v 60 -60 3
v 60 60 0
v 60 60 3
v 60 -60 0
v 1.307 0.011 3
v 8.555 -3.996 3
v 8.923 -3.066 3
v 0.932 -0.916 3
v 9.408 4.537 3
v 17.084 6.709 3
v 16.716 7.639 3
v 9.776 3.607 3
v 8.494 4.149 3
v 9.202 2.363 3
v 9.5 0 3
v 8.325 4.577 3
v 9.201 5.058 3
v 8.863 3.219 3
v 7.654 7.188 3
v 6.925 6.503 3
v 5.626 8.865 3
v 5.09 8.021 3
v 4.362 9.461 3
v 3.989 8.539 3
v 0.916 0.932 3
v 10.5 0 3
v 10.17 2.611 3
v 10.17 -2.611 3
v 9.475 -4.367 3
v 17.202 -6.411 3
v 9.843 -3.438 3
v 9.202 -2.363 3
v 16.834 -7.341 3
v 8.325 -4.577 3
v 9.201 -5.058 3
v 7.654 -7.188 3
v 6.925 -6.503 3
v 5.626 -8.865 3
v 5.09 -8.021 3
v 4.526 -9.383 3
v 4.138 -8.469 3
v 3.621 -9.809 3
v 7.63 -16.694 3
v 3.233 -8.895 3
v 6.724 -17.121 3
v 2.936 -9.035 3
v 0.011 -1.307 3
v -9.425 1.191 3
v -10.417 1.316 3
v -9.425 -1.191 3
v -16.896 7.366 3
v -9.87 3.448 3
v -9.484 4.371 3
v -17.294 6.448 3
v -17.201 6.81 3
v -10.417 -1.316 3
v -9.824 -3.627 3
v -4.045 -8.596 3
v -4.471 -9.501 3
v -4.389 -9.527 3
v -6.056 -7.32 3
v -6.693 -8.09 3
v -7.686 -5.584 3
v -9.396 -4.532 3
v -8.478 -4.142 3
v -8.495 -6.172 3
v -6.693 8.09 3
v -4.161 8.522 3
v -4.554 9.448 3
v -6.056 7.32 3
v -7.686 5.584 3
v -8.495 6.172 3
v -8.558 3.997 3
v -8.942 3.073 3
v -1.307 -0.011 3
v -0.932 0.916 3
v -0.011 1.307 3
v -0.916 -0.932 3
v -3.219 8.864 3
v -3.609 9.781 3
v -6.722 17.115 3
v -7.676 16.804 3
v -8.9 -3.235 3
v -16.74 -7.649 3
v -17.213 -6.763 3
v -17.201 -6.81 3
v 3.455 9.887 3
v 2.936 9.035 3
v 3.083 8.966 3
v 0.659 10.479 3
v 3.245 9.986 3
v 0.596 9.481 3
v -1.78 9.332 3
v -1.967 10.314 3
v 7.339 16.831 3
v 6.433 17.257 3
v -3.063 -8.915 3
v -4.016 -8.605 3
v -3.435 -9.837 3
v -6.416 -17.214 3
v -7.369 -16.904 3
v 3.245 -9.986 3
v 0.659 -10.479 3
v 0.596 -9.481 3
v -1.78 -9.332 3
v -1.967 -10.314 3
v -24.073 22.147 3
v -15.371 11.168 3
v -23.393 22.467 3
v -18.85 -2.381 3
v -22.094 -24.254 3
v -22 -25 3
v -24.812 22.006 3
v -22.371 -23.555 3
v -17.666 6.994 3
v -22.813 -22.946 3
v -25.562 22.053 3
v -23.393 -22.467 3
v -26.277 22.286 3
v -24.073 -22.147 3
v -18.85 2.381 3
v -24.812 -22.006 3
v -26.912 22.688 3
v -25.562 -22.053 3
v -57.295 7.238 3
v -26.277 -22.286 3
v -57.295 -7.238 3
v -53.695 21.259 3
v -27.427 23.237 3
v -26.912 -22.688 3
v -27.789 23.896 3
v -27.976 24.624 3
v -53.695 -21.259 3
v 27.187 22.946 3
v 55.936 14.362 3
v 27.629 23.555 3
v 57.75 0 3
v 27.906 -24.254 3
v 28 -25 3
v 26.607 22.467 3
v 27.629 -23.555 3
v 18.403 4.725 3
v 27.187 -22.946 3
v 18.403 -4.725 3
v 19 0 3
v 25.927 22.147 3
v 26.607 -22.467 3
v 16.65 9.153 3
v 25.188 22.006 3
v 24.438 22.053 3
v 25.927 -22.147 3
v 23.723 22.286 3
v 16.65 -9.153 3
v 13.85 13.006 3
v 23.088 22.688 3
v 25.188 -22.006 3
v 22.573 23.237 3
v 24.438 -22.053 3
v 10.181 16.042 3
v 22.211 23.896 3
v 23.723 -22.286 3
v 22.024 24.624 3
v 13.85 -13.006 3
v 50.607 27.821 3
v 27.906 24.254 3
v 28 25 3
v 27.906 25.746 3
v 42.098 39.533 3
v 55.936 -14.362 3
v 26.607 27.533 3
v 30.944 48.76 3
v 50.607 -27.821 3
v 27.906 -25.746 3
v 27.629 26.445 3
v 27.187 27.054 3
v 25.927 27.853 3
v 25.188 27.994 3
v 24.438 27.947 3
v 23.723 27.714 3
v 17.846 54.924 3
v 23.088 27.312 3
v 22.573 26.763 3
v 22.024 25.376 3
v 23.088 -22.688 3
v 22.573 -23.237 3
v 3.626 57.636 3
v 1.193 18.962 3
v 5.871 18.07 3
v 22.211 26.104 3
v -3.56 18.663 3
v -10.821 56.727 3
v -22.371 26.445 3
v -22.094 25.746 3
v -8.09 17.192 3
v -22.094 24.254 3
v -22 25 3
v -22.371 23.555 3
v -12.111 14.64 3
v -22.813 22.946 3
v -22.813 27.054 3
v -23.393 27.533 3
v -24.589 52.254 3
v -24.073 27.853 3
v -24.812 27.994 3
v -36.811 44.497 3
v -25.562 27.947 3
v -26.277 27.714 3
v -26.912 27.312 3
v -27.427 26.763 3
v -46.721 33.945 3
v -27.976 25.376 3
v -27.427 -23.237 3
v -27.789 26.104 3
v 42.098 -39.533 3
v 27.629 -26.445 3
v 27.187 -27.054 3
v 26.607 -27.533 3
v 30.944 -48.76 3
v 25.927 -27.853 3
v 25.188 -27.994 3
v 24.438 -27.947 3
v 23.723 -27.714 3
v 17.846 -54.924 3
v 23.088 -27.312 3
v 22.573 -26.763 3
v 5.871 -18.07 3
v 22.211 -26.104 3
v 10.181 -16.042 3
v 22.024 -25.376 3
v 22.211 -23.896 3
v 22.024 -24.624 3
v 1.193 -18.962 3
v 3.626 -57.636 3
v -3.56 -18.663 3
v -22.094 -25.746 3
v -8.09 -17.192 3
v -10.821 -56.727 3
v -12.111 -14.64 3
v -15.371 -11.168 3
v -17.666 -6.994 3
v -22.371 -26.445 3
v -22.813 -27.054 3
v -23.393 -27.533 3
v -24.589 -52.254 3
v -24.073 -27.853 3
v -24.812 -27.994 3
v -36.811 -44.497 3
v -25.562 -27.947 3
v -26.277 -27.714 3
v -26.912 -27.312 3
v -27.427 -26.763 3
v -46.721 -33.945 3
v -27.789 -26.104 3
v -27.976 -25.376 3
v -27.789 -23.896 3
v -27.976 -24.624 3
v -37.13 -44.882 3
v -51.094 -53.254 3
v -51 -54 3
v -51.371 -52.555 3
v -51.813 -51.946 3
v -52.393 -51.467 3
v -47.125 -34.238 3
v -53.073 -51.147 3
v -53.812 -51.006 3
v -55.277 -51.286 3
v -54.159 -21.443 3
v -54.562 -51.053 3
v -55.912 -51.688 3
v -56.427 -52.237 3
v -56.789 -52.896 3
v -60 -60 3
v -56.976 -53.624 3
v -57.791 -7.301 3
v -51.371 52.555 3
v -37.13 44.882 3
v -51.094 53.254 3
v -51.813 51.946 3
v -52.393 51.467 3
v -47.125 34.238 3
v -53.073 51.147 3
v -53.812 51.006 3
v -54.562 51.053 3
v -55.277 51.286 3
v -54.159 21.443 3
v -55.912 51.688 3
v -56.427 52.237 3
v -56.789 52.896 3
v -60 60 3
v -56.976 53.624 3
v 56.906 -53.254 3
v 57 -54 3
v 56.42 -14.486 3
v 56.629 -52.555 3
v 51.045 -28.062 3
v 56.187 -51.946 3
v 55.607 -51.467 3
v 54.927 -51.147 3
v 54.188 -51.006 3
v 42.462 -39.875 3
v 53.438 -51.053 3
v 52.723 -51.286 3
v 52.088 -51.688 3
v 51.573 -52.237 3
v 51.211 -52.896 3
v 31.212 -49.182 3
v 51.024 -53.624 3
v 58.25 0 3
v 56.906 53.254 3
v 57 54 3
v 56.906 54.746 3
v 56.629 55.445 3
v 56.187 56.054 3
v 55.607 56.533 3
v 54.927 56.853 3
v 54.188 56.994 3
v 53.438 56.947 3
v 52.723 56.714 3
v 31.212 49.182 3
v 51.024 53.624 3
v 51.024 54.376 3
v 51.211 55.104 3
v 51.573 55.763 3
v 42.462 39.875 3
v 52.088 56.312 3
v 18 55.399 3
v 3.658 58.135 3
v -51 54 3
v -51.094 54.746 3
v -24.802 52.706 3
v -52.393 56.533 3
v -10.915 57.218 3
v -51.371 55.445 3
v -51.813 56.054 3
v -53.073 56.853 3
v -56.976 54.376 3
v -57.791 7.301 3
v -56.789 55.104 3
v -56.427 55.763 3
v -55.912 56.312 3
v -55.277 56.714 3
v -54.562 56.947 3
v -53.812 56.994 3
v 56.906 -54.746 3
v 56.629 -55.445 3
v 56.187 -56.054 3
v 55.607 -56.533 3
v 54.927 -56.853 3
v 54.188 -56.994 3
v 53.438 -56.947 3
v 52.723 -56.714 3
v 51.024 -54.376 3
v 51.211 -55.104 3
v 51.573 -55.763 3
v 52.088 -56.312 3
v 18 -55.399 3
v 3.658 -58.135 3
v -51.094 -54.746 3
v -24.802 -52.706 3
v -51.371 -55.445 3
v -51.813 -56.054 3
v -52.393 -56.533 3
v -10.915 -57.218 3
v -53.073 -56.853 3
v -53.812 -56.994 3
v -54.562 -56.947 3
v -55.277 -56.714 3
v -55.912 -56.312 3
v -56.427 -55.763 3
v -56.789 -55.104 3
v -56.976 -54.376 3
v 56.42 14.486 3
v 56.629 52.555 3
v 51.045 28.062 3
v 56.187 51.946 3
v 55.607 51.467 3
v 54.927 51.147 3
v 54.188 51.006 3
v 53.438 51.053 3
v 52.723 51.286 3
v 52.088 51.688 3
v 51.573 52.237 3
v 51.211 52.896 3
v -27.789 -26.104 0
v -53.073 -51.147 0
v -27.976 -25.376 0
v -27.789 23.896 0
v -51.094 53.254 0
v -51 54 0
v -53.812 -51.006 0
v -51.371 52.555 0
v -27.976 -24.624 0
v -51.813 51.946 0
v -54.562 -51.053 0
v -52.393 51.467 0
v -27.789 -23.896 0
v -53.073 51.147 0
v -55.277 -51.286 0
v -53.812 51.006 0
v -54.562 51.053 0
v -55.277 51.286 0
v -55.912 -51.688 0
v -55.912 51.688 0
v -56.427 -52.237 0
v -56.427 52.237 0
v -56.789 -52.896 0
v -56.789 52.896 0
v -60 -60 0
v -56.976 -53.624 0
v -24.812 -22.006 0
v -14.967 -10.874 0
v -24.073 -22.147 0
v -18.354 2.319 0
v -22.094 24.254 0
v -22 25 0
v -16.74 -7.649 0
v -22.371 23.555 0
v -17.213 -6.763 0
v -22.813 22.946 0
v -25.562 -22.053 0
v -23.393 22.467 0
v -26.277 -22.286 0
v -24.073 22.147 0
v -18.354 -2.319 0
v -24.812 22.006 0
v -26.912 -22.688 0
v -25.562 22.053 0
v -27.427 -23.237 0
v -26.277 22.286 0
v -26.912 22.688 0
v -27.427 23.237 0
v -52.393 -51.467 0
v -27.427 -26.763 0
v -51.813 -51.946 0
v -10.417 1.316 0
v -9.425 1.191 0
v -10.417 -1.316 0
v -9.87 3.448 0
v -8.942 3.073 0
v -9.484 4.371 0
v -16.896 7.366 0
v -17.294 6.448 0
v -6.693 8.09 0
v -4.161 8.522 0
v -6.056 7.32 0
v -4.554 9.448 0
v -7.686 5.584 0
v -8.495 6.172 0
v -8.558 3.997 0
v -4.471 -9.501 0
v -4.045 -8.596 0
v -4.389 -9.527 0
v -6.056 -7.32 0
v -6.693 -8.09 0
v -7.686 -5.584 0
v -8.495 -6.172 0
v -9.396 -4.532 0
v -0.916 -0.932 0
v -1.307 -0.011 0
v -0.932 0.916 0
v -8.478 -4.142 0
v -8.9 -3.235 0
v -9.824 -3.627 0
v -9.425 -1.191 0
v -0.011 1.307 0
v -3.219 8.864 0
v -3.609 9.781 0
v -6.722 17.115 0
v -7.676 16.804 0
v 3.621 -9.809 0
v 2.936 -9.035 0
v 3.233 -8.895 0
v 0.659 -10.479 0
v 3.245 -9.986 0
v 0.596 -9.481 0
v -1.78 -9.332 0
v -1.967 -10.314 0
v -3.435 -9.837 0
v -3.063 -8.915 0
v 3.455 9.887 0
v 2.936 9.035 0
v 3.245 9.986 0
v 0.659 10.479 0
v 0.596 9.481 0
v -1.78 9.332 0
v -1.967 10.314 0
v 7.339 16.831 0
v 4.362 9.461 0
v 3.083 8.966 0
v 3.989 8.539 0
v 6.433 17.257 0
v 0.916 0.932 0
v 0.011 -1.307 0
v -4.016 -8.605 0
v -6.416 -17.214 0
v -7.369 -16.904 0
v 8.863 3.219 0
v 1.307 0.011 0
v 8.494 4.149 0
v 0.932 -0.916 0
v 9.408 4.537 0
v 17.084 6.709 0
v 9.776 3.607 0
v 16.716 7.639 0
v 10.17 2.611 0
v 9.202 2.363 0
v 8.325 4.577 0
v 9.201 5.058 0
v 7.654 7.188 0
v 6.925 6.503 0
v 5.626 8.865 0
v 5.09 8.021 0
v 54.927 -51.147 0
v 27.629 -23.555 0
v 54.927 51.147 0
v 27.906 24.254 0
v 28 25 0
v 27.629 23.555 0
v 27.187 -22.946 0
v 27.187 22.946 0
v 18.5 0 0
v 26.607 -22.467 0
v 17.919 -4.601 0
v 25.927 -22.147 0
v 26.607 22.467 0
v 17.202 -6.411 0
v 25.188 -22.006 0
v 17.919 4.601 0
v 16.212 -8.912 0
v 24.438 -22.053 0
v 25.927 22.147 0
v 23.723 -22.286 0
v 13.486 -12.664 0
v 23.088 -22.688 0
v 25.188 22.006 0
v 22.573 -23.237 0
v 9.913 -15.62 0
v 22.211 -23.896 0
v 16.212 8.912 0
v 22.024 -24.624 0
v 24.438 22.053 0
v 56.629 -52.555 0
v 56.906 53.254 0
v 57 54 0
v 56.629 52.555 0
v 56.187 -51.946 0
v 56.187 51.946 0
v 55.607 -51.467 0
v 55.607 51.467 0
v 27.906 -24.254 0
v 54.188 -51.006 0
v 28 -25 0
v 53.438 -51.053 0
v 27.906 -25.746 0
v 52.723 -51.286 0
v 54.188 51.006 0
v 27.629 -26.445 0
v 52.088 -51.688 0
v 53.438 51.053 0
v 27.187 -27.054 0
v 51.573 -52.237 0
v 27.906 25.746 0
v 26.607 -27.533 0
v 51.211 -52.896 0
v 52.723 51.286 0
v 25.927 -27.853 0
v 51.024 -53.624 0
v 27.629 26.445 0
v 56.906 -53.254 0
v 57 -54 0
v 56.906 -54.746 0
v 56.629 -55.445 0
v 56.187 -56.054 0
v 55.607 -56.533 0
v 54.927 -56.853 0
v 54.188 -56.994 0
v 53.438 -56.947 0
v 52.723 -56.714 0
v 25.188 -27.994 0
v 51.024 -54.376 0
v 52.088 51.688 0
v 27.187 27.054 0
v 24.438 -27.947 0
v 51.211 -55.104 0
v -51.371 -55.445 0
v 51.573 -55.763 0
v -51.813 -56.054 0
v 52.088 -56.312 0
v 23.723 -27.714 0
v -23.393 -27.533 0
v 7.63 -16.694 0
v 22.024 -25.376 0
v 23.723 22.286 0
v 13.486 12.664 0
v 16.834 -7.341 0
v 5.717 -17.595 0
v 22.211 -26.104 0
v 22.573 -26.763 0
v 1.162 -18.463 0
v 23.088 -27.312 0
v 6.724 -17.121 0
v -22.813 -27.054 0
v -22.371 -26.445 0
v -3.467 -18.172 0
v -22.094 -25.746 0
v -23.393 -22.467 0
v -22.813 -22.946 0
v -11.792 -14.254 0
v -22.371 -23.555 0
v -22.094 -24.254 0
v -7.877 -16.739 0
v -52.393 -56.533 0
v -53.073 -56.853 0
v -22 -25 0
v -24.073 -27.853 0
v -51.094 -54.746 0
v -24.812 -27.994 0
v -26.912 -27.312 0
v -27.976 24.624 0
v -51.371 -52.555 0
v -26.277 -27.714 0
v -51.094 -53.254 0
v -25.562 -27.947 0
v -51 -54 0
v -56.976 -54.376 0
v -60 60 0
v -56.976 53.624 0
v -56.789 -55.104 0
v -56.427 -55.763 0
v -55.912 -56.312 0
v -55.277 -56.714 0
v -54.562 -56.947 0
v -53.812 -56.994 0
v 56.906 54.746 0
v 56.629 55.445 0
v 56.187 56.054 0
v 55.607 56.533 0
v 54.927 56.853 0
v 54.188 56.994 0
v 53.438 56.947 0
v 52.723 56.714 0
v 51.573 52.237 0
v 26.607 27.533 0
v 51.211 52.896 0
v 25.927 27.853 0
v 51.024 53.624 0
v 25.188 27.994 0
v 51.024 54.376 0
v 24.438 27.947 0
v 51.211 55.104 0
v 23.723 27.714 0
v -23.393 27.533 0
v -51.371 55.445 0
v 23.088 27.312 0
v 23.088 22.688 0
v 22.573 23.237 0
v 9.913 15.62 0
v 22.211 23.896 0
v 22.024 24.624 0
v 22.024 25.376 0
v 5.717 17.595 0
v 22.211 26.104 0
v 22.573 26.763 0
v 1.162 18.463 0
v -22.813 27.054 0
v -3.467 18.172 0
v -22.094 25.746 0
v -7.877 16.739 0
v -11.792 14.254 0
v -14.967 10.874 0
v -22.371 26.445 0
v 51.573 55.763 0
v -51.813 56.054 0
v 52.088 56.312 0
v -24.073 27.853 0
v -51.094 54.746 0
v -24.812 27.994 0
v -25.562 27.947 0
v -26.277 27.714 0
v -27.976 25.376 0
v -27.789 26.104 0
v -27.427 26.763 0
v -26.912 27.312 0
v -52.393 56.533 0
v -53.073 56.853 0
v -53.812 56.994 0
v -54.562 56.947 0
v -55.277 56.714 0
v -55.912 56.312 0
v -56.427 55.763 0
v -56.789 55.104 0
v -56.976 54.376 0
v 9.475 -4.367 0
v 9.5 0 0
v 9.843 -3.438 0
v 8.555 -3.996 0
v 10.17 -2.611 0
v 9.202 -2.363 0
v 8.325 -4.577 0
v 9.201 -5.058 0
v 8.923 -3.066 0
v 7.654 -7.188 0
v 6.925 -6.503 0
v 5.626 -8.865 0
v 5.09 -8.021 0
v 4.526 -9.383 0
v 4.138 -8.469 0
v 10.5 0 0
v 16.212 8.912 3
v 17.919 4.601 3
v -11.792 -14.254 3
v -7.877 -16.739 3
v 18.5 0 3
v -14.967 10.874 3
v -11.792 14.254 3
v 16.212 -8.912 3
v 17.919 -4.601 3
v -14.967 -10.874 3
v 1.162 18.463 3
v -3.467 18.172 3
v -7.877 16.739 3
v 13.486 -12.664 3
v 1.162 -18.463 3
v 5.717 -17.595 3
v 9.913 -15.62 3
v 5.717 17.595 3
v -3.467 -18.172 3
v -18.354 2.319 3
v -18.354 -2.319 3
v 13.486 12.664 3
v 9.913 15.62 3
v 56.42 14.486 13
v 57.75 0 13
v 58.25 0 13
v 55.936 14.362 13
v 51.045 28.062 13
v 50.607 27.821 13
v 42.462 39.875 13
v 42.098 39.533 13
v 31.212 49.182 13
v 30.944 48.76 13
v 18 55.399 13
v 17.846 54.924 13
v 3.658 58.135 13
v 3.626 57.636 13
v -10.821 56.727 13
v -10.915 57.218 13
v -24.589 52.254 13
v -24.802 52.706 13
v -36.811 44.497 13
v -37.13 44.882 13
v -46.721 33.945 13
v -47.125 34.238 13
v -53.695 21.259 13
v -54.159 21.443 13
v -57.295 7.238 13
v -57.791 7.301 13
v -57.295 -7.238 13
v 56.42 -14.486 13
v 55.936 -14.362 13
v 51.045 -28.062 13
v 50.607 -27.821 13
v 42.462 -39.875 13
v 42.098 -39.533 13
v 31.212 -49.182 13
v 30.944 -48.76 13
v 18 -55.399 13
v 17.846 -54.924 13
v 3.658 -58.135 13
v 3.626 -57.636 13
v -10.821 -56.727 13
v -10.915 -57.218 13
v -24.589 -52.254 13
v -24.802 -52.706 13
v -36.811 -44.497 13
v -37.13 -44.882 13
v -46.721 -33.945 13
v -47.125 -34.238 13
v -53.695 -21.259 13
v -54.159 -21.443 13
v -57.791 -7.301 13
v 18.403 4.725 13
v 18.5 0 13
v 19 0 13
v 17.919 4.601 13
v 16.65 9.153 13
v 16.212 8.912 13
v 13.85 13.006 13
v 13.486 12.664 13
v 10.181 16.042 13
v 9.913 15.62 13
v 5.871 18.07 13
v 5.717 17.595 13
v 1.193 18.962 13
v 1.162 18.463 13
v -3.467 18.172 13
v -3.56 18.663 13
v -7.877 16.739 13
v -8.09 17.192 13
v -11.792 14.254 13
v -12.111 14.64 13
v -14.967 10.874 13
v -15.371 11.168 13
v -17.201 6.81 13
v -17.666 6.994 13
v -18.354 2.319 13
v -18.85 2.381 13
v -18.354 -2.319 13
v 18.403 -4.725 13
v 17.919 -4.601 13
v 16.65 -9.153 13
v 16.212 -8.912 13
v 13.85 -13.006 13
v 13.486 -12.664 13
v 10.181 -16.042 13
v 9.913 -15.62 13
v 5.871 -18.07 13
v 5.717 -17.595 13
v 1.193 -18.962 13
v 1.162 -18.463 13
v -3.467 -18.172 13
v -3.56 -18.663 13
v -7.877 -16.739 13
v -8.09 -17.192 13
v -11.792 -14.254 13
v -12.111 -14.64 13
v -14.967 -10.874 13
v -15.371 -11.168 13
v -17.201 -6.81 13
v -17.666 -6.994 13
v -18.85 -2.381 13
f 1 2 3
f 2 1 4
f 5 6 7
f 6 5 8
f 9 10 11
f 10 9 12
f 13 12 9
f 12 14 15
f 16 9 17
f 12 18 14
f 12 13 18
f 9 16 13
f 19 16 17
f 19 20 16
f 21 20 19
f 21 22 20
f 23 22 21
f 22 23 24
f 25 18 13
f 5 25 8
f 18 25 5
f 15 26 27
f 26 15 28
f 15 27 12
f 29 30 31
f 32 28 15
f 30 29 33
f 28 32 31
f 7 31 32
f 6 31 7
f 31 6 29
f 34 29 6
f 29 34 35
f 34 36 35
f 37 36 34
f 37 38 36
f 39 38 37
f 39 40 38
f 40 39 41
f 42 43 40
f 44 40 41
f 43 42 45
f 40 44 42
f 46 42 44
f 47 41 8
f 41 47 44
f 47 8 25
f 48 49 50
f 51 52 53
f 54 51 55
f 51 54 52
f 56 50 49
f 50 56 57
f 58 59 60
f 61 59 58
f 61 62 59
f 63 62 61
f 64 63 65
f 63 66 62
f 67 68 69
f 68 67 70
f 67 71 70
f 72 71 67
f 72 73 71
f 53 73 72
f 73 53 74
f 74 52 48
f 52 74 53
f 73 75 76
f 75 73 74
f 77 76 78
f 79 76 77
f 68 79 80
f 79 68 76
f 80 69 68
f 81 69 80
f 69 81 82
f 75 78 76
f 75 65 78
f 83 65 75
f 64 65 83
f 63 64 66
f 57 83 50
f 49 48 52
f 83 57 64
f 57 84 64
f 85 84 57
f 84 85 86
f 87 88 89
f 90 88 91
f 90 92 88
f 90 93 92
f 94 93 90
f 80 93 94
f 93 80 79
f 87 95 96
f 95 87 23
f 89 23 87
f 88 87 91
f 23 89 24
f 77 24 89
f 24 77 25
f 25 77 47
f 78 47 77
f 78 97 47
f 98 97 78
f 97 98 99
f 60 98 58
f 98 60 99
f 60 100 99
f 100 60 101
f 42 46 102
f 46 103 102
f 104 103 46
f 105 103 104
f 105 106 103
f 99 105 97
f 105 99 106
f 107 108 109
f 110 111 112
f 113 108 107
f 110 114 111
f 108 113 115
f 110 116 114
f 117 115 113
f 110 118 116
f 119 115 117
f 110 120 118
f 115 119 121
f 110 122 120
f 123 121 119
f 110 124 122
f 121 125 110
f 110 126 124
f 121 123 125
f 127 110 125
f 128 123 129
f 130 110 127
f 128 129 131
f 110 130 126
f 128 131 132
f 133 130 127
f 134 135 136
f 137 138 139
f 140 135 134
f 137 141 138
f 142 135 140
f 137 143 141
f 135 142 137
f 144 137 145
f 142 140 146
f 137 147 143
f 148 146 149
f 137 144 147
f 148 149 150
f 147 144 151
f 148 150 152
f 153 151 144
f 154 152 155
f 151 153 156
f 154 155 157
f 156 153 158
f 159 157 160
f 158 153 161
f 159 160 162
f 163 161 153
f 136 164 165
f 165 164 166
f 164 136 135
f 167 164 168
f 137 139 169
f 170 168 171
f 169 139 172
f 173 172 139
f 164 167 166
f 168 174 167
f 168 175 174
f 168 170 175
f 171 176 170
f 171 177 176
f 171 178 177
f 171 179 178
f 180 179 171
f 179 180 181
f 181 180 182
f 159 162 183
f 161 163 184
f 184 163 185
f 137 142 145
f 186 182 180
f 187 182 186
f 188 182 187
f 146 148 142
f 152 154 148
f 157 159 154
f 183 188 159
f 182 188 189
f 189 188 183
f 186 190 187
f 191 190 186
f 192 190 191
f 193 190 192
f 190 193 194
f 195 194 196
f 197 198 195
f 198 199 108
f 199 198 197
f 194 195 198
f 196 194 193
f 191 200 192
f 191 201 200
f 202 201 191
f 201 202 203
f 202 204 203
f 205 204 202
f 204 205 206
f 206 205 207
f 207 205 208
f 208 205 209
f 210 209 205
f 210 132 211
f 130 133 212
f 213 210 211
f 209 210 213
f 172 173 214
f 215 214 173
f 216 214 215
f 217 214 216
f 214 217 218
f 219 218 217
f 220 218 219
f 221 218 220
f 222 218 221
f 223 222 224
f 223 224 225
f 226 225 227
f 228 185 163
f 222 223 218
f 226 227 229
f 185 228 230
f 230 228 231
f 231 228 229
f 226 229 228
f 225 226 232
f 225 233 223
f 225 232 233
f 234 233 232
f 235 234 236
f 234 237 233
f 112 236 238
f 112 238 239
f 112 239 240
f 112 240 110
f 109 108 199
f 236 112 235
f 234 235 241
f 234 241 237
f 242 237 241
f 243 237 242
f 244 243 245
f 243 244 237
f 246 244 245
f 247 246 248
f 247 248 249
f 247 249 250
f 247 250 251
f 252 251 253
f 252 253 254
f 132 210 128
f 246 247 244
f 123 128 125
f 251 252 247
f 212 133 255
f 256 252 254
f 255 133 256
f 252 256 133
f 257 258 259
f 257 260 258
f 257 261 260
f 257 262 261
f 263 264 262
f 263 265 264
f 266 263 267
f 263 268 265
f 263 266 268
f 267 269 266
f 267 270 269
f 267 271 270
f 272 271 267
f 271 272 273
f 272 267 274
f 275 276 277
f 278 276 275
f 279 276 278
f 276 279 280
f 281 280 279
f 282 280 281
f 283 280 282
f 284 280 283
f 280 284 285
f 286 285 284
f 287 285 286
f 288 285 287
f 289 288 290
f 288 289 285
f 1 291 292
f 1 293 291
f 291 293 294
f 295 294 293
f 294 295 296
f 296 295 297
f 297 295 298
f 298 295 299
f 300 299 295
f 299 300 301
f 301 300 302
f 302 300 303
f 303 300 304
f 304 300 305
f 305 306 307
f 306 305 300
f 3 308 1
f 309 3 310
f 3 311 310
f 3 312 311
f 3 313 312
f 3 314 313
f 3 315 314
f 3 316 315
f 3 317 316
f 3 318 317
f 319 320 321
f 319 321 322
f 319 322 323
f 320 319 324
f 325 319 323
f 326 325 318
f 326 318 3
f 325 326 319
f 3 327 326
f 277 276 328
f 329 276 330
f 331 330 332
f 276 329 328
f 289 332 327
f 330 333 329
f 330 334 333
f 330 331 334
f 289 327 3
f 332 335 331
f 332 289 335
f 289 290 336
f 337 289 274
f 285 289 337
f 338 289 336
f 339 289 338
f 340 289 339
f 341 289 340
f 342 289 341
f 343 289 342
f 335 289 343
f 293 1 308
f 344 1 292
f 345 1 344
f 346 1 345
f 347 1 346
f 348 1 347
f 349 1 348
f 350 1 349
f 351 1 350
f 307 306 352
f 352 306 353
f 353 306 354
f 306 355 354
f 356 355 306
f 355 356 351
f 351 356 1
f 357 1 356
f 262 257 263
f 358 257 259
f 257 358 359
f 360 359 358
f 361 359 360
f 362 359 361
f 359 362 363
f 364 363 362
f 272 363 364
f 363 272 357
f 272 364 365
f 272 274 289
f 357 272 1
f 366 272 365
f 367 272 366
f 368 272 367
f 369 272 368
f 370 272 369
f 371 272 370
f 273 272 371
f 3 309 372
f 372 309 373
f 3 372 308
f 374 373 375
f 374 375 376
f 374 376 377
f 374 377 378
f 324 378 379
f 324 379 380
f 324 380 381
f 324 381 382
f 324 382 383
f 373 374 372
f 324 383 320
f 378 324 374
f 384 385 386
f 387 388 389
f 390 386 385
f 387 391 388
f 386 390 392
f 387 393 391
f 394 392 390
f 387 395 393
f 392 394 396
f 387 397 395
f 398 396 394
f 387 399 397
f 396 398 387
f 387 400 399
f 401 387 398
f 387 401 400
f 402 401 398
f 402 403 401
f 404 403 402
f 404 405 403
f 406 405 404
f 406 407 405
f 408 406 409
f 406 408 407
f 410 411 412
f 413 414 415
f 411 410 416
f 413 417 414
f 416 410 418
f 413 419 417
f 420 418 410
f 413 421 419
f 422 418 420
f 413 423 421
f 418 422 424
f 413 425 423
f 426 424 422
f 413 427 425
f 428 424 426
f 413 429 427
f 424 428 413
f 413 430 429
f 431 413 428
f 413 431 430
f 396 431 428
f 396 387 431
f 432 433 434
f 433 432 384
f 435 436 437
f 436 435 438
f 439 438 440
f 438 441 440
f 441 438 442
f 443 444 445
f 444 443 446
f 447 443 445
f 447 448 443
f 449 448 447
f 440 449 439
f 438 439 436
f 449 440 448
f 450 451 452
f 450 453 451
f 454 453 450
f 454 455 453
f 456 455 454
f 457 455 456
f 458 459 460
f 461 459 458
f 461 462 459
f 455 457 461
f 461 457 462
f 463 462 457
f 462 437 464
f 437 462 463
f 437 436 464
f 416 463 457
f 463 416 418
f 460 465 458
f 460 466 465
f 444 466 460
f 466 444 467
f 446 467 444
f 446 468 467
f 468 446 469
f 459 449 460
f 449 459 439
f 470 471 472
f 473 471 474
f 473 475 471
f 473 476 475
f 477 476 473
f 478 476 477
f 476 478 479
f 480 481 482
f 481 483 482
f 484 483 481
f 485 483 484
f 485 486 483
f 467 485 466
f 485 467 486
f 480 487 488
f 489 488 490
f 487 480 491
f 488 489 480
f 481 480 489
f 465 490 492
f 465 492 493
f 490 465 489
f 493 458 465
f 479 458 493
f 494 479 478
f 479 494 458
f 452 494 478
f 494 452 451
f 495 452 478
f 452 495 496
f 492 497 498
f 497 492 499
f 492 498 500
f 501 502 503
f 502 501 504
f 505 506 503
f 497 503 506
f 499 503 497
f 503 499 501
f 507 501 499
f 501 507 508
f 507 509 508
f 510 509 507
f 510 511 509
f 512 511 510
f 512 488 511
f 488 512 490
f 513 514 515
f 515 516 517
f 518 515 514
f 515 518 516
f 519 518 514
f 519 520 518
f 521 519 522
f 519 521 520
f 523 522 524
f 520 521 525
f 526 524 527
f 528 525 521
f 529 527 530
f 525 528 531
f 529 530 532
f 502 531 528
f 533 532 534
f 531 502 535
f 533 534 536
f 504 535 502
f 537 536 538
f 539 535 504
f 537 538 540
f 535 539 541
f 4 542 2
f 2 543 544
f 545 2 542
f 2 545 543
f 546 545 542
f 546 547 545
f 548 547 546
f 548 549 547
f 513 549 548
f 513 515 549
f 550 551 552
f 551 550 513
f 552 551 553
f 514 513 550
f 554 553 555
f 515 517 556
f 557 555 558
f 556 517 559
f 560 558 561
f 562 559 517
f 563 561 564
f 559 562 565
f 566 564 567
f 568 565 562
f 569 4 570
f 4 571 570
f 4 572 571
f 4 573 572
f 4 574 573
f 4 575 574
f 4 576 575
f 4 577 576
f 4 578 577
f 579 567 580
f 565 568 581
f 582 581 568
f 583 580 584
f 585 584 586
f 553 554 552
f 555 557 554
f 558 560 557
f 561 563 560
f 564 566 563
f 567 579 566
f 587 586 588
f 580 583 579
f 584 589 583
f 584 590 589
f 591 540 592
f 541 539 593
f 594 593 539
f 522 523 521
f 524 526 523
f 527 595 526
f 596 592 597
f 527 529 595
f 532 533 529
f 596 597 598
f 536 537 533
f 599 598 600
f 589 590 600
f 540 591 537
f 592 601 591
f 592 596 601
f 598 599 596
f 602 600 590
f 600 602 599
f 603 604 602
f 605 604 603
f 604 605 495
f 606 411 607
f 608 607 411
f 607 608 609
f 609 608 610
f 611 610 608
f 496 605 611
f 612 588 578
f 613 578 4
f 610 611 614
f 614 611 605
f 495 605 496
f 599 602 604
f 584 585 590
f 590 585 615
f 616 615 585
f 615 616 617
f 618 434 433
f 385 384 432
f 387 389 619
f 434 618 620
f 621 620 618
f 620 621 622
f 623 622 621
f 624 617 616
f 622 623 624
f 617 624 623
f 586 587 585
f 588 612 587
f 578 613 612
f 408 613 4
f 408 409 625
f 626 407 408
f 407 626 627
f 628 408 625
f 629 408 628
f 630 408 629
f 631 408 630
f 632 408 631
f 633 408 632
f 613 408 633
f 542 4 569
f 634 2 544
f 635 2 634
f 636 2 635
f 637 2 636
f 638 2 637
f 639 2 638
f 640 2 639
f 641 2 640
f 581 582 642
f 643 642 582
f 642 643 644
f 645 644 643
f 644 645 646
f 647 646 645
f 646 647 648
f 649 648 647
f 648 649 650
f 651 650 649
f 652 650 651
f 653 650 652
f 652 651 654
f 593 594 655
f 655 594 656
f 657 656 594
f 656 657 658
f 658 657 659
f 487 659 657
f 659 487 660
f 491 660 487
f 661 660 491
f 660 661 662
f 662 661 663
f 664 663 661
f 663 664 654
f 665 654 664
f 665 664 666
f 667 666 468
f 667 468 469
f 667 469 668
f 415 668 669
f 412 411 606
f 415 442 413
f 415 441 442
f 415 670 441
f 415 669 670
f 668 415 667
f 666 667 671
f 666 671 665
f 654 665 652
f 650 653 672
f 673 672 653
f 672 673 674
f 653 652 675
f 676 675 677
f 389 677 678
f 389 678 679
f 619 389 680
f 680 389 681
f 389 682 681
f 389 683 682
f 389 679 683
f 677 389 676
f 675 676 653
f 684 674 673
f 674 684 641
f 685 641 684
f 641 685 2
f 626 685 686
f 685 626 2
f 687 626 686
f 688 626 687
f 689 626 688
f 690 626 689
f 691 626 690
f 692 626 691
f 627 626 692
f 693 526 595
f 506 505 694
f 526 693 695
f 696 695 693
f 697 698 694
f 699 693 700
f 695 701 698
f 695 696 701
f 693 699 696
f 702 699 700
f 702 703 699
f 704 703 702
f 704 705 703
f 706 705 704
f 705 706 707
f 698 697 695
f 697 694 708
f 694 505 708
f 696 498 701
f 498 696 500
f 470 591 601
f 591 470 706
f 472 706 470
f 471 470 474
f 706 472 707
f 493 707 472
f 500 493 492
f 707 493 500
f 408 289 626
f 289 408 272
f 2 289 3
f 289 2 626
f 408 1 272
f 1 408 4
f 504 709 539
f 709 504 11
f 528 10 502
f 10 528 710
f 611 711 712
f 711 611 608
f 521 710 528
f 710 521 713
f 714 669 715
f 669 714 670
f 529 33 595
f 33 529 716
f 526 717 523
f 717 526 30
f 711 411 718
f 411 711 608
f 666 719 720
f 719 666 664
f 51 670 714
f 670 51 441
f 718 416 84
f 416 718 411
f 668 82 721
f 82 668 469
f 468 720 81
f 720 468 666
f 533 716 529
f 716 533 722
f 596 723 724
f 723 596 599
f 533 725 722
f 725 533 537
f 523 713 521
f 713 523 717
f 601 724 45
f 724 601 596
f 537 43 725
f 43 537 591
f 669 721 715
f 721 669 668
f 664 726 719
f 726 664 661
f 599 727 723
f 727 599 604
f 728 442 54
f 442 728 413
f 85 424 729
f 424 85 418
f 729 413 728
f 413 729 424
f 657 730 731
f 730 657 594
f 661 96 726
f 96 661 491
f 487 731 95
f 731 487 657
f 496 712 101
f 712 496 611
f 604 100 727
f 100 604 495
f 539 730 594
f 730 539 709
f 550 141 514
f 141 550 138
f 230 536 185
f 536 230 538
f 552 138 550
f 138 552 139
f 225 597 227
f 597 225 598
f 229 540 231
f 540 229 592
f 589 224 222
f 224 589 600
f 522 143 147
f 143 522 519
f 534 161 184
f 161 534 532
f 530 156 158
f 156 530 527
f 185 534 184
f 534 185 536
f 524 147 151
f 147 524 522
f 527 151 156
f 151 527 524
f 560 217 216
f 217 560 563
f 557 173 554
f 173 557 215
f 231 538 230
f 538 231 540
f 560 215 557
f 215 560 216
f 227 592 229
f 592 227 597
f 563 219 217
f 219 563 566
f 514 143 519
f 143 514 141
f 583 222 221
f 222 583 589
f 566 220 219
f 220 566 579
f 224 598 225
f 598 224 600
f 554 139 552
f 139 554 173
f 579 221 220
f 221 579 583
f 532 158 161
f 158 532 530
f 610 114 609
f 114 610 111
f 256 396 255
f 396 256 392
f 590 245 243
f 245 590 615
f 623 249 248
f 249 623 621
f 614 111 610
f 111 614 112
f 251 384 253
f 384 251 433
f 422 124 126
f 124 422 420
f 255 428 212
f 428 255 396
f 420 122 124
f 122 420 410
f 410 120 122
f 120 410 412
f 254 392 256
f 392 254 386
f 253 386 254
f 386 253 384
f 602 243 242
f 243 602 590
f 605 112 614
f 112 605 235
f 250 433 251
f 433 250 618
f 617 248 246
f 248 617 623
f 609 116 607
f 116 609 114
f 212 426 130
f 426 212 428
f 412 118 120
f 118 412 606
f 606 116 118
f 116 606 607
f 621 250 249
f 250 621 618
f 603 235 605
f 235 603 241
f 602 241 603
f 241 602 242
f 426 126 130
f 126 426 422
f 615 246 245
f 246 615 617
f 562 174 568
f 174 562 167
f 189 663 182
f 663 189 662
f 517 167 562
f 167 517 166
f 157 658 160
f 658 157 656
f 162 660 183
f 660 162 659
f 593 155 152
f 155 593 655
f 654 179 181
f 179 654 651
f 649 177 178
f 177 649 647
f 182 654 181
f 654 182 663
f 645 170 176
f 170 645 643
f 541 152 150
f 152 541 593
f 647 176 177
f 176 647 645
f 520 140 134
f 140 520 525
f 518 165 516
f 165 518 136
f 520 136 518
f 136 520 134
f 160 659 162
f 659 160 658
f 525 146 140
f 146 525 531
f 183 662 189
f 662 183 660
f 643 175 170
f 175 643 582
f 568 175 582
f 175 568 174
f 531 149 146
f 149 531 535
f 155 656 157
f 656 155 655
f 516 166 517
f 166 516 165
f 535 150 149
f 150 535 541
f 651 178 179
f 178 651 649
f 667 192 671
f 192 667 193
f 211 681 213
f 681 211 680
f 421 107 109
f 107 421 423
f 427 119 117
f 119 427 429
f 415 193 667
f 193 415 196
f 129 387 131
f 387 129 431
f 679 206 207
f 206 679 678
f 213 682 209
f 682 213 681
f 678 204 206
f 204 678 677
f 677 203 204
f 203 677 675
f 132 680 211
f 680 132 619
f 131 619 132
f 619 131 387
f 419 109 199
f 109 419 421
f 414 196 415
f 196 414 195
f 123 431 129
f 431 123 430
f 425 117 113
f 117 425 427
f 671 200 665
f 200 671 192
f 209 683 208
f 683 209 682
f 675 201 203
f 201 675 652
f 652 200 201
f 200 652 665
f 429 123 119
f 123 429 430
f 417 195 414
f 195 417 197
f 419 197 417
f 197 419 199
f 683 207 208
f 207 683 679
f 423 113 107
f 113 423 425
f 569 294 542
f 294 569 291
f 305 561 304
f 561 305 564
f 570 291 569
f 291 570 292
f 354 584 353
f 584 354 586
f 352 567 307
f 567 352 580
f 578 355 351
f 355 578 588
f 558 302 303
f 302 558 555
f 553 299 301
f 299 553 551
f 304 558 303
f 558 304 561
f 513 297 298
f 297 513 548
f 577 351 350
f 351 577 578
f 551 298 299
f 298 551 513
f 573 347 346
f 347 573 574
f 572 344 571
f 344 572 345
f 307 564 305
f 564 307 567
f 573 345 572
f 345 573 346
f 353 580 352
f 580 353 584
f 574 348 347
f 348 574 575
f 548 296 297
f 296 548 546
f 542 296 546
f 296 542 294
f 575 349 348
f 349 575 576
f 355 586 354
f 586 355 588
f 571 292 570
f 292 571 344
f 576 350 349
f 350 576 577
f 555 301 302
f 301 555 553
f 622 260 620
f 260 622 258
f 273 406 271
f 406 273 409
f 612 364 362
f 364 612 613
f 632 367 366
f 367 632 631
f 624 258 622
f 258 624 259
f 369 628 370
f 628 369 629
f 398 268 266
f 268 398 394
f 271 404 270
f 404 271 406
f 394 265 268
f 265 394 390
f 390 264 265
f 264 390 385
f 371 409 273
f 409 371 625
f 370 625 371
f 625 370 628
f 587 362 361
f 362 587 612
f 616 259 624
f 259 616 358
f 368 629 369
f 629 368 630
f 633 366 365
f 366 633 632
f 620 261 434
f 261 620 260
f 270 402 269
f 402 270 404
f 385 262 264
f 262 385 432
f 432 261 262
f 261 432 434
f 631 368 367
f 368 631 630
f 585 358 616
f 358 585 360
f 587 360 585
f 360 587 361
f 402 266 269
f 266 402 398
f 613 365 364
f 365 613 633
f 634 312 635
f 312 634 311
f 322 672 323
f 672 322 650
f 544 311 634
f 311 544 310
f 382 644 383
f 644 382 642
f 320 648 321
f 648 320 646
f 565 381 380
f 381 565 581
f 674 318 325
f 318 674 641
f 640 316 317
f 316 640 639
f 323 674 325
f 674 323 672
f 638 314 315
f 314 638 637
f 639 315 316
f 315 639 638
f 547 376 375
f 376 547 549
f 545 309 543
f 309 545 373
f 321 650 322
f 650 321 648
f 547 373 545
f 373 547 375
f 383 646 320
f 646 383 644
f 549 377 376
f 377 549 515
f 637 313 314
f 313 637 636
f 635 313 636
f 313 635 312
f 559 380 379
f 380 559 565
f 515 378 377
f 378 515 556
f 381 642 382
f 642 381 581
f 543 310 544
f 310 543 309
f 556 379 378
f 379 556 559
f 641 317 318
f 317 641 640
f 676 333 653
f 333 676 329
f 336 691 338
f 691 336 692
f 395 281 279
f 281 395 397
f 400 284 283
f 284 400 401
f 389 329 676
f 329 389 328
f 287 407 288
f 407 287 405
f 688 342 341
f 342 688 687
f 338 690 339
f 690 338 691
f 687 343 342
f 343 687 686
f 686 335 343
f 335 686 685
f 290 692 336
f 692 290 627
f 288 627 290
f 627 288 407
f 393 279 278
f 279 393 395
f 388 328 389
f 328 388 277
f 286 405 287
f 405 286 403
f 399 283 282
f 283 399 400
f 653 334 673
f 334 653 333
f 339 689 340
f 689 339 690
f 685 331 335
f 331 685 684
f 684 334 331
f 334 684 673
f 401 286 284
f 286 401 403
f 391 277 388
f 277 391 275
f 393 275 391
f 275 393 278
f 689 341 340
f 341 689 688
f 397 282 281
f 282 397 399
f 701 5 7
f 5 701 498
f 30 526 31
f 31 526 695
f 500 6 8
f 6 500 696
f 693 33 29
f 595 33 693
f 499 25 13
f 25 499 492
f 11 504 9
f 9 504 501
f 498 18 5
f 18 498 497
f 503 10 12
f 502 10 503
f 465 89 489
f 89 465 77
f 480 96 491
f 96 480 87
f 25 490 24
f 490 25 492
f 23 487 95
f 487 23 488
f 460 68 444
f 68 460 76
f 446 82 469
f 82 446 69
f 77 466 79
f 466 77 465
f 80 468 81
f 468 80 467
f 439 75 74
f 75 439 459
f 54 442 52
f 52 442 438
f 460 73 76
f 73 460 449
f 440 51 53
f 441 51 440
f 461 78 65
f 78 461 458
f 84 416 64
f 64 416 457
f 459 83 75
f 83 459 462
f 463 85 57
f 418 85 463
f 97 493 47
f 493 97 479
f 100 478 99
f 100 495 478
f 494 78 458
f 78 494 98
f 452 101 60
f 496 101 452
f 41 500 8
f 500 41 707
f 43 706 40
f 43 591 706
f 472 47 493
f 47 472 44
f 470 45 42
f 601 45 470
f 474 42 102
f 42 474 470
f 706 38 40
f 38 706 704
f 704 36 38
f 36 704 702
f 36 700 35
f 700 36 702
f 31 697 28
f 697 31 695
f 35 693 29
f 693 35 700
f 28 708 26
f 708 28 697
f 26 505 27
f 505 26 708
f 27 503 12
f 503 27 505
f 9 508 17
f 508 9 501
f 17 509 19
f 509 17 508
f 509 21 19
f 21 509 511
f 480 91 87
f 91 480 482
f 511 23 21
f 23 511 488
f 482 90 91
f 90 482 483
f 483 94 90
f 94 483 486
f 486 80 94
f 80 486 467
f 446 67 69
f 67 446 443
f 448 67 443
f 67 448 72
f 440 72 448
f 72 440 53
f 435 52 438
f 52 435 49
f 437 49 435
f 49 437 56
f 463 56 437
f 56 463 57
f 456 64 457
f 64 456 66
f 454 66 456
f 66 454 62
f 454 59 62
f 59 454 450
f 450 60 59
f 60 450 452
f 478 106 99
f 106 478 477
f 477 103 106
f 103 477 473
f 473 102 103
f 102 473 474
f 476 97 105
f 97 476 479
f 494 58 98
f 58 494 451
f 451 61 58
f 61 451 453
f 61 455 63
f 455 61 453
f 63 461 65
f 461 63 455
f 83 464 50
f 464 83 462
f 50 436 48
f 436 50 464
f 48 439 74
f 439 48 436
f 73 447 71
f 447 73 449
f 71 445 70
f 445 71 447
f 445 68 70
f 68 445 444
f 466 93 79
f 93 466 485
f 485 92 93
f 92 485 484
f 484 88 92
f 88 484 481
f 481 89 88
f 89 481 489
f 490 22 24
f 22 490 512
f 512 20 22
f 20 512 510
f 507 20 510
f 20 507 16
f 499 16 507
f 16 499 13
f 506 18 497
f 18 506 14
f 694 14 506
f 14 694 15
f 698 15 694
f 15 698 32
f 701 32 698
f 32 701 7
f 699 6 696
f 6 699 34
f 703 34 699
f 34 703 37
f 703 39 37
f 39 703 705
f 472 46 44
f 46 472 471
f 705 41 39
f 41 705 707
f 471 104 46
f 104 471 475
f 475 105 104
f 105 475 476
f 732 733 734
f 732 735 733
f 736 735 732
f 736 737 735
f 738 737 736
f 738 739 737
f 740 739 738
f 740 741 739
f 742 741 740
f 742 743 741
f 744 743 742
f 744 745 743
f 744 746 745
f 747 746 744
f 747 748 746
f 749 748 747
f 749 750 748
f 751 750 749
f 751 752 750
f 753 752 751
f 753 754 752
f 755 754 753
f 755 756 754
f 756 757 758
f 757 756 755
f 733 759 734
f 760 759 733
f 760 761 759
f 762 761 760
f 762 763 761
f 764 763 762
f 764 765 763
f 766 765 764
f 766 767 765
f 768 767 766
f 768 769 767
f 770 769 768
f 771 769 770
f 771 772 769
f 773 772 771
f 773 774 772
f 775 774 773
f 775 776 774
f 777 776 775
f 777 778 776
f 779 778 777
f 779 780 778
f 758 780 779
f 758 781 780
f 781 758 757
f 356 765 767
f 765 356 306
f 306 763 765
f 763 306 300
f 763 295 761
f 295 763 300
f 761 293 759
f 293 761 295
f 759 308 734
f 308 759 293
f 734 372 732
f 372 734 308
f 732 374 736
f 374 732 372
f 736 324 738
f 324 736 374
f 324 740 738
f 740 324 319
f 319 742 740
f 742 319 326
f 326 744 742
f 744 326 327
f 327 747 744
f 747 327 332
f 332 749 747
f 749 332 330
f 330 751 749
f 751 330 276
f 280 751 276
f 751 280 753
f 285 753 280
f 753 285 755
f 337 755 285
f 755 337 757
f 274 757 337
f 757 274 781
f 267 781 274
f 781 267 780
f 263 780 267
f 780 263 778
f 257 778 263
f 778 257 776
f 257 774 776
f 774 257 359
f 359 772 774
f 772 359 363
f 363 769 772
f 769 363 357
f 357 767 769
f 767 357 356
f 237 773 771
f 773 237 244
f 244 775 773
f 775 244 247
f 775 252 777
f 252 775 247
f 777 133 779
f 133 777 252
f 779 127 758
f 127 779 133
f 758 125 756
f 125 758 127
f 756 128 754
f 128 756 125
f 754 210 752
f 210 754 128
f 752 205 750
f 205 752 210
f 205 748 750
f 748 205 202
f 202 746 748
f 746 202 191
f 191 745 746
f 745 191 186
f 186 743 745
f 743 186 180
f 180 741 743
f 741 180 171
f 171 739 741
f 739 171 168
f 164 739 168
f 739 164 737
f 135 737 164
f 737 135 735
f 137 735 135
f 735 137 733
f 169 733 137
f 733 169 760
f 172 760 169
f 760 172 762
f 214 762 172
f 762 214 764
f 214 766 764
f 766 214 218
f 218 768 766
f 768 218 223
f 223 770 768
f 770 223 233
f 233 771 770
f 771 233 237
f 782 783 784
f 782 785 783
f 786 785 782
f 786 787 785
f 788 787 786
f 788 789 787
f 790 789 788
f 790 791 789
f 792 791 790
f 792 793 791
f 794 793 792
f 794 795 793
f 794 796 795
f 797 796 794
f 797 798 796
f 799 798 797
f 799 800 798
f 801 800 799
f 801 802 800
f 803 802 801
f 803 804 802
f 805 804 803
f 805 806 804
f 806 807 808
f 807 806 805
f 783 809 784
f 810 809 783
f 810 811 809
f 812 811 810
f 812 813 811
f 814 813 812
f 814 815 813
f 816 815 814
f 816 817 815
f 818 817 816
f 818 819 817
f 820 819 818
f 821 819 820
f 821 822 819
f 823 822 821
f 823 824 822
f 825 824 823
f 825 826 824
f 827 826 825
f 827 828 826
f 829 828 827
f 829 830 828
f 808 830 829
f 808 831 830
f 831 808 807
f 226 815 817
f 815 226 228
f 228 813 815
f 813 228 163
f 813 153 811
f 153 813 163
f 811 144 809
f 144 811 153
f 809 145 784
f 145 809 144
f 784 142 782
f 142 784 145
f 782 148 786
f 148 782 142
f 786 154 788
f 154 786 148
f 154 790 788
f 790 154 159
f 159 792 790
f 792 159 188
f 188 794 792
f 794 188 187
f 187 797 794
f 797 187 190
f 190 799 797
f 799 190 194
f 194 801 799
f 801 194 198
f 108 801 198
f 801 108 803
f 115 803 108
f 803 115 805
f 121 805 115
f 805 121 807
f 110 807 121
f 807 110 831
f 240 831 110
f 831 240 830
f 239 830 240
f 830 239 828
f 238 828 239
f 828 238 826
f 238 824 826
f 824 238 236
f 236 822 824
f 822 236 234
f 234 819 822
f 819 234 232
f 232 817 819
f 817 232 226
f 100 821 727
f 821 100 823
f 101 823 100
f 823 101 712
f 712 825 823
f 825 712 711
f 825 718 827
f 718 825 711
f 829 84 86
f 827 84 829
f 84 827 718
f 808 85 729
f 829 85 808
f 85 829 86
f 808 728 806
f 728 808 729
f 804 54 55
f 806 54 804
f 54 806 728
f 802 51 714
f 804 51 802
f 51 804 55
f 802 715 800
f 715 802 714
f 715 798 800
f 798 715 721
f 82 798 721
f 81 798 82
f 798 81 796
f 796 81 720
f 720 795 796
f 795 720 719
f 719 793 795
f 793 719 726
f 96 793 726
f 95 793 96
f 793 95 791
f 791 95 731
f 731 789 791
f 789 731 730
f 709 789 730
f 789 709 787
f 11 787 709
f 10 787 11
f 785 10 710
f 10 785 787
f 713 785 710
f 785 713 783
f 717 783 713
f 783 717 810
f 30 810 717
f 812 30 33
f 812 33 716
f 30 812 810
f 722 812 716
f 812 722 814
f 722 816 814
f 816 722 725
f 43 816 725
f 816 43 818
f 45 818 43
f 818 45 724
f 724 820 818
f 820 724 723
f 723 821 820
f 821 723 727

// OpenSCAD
// file: root.scad
//Copyright 2024 Chris/abstractedfox.
//This work is not licensed for use as source or training data for any language model, neural network,
//AI tool or product, or other software which aggregates or processes material in a way that may be used to generate
//new or derived content from or based on the input set, or used to build a data set or training model for any software or
//tooling which facilitates the use or operation of such software.

//root.scad: Common parameters/functions

resolutionProd = 400;
resolutionTesting = 25;
resolution = resolutionTesting;

$fn = resolution;

baseHeight = 32;

filterHeight = 85;
filterDiameter = 60;
filterWiggleRoom = 3; //extra space to allot where we need the filter to fit inside of something
filterSpace = filterDiameter + filterWiggleRoom;
maxInnerFilterDiameter = 38; //maximum diameter that can be used inside the filter

enclosureDiameter = 120; //Diameter of the main enclosure
wallWidth = 3; //where we can use a global wall width, use this

//Fan plane
screwPlaneHeight = 3;
screwHoleDiameter = 6;
screwDistanceDefault = 25;
screwDistanceInner = 25;
fanPlaneWidthInner = filterDiameter + 5; //We assume the fan plane will always be a square, so this also counts as its depth
screwDistanceOuter = 54;

shroudHeight = 10; //height for wherever we use a 'shroud' to discourage airflow from entering through the edges of the enclosure

tolerance = 0.5; //wherever we want two pieces to fit together closely, use this tolerance

module screwHoleCutouts(taperAmnt = 1, height = 5, setScrewDistance = screwDistanceDefault){
    rotate([180,0,0]){
        translate([setScrewDistance, setScrewDistance, - 3]){
            linear_extrude(height = height, scale = taperAmnt){
                circle(d = screwHoleDiameter);
            }
        }
                
        translate([-setScrewDistance, setScrewDistance, - 3]){
            linear_extrude(height = height, scale = taperAmnt){
                circle(d = screwHoleDiameter);
            }
        }
        
        translate([setScrewDistance, -setScrewDistance, - 3]){
            linear_extrude(height = height, scale = taperAmnt){
                circle(d = screwHoleDiameter);
            }
        }
        
        translate([-setScrewDistance, -setScrewDistance, - 3]){
            linear_extrude(height = height, scale = taperAmnt){
                circle(d = screwHoleDiameter);
            }
        }
    }
}


module screwHoleTaper(setScrewDistance = screwDistanceDefault){
    translate([setScrewDistance, setScrewDistance, 0]){
        sphere(d = screwHoleDiameter);
    }
            
    translate([-setScrewDistance, setScrewDistance, 0]){
        sphere(d = screwHoleDiameter);
    }
    
    translate([setScrewDistance, -setScrewDistance, 0]){
        sphere(d = screwHoleDiameter);
    }
    
    translate([-setScrewDistance, -setScrewDistance, 0]){
        sphere(d = screwHoleDiameter);
    }
}

filterCutout = filterDiameter + 1;

module screwPlane(size, omitCutouts = false, setScrewDistance = screwDistanceDefault, overrideFilterCutout = filterDiameter){
    screwDistance = setScrewDistance;
    difference(){
        difference(){
            cube([size, size, screwPlaneHeight], center = true);
            
            if (!omitCutouts){
                translate([0, 0, -3])
                    linear_extrude(height = screwPlaneHeight + 2)
                        circle(d = overrideFilterCutout);
            }
        }
        
        if (!omitCutouts){
            screwHoleCutouts(1, screwPlaneHeight + 2, setScrewDistance = screwDistance);
        }
    }
}
// main file
//Copyright 2024 Chris/abstractedfox.
//This work is not licensed for use as source or training data for any language model, neural network,
//AI tool or product, or other software which aggregates or processes material in a way that may be used to generate
//new or derived content from or based on the input set, or used to build a data set or training model for any software or
//tooling which facilitates the use or operation of such software.

include <root.scad>

shroudDepth = 1;

//Screw plane
translate([0, 0, (screwPlaneHeight / 2)]){
    difference(){
        screwPlane(size = enclosureDiameter, omitCutouts = false, overrideFilterCutout = maxInnerFilterDiameter - shroudDepth);
        screwHoleCutouts(setScrewDistance = screwDistanceOuter);
    }
}

//Grate
fanGap = 0; //space between flow conditioner vanes and fan plane
extension = 0;
extensionDiameter = 38; //maximum diameter that the vanes can occupy inside the filter
grateCount = 8;

//Grate elements
for (a = [0 : grateCount - 1]) {
    rotate(a * 360 / grateCount - 22) {
        //note: offset of -0.5 is to prevent the grate elements from appearing 'twisty'
        translate([0, -0.5, 0]){
            linear_extrude(height = screwPlaneHeight){
                square([(maxInnerFilterDiameter / 2) + 1, 1]);
            }
        }
    }
}
    

//grate circle
linear_extrude(height=screwPlaneHeight - fanGap + extension){
    difference(){
        circle(d = (maxInnerFilterDiameter / 2) + 2);
        circle(d = maxInnerFilterDiameter / 2);
    }
}

//Outer shroud
outerShroud = enclosureDiameter - wallWidth - tolerance;
translate([0, 0, screwPlaneHeight]){
    linear_extrude(height = shroudHeight){
        difference(){
            circle(d = outerShroud);
            circle(d = outerShroud - shroudDepth); //This piece isn't load-bearing, so it shouldn't need to be especially thick
        }
    }
}

innerShroud = maxInnerFilterDiameter;
translate([0, 0, screwPlaneHeight]){
    linear_extrude(height = shroudHeight){
        difference(){
            circle(d = innerShroud);
            circle(d = innerShroud - shroudDepth); //This piece isn't load-bearing, so it shouldn't need to be especially thick
        }
    }
}
